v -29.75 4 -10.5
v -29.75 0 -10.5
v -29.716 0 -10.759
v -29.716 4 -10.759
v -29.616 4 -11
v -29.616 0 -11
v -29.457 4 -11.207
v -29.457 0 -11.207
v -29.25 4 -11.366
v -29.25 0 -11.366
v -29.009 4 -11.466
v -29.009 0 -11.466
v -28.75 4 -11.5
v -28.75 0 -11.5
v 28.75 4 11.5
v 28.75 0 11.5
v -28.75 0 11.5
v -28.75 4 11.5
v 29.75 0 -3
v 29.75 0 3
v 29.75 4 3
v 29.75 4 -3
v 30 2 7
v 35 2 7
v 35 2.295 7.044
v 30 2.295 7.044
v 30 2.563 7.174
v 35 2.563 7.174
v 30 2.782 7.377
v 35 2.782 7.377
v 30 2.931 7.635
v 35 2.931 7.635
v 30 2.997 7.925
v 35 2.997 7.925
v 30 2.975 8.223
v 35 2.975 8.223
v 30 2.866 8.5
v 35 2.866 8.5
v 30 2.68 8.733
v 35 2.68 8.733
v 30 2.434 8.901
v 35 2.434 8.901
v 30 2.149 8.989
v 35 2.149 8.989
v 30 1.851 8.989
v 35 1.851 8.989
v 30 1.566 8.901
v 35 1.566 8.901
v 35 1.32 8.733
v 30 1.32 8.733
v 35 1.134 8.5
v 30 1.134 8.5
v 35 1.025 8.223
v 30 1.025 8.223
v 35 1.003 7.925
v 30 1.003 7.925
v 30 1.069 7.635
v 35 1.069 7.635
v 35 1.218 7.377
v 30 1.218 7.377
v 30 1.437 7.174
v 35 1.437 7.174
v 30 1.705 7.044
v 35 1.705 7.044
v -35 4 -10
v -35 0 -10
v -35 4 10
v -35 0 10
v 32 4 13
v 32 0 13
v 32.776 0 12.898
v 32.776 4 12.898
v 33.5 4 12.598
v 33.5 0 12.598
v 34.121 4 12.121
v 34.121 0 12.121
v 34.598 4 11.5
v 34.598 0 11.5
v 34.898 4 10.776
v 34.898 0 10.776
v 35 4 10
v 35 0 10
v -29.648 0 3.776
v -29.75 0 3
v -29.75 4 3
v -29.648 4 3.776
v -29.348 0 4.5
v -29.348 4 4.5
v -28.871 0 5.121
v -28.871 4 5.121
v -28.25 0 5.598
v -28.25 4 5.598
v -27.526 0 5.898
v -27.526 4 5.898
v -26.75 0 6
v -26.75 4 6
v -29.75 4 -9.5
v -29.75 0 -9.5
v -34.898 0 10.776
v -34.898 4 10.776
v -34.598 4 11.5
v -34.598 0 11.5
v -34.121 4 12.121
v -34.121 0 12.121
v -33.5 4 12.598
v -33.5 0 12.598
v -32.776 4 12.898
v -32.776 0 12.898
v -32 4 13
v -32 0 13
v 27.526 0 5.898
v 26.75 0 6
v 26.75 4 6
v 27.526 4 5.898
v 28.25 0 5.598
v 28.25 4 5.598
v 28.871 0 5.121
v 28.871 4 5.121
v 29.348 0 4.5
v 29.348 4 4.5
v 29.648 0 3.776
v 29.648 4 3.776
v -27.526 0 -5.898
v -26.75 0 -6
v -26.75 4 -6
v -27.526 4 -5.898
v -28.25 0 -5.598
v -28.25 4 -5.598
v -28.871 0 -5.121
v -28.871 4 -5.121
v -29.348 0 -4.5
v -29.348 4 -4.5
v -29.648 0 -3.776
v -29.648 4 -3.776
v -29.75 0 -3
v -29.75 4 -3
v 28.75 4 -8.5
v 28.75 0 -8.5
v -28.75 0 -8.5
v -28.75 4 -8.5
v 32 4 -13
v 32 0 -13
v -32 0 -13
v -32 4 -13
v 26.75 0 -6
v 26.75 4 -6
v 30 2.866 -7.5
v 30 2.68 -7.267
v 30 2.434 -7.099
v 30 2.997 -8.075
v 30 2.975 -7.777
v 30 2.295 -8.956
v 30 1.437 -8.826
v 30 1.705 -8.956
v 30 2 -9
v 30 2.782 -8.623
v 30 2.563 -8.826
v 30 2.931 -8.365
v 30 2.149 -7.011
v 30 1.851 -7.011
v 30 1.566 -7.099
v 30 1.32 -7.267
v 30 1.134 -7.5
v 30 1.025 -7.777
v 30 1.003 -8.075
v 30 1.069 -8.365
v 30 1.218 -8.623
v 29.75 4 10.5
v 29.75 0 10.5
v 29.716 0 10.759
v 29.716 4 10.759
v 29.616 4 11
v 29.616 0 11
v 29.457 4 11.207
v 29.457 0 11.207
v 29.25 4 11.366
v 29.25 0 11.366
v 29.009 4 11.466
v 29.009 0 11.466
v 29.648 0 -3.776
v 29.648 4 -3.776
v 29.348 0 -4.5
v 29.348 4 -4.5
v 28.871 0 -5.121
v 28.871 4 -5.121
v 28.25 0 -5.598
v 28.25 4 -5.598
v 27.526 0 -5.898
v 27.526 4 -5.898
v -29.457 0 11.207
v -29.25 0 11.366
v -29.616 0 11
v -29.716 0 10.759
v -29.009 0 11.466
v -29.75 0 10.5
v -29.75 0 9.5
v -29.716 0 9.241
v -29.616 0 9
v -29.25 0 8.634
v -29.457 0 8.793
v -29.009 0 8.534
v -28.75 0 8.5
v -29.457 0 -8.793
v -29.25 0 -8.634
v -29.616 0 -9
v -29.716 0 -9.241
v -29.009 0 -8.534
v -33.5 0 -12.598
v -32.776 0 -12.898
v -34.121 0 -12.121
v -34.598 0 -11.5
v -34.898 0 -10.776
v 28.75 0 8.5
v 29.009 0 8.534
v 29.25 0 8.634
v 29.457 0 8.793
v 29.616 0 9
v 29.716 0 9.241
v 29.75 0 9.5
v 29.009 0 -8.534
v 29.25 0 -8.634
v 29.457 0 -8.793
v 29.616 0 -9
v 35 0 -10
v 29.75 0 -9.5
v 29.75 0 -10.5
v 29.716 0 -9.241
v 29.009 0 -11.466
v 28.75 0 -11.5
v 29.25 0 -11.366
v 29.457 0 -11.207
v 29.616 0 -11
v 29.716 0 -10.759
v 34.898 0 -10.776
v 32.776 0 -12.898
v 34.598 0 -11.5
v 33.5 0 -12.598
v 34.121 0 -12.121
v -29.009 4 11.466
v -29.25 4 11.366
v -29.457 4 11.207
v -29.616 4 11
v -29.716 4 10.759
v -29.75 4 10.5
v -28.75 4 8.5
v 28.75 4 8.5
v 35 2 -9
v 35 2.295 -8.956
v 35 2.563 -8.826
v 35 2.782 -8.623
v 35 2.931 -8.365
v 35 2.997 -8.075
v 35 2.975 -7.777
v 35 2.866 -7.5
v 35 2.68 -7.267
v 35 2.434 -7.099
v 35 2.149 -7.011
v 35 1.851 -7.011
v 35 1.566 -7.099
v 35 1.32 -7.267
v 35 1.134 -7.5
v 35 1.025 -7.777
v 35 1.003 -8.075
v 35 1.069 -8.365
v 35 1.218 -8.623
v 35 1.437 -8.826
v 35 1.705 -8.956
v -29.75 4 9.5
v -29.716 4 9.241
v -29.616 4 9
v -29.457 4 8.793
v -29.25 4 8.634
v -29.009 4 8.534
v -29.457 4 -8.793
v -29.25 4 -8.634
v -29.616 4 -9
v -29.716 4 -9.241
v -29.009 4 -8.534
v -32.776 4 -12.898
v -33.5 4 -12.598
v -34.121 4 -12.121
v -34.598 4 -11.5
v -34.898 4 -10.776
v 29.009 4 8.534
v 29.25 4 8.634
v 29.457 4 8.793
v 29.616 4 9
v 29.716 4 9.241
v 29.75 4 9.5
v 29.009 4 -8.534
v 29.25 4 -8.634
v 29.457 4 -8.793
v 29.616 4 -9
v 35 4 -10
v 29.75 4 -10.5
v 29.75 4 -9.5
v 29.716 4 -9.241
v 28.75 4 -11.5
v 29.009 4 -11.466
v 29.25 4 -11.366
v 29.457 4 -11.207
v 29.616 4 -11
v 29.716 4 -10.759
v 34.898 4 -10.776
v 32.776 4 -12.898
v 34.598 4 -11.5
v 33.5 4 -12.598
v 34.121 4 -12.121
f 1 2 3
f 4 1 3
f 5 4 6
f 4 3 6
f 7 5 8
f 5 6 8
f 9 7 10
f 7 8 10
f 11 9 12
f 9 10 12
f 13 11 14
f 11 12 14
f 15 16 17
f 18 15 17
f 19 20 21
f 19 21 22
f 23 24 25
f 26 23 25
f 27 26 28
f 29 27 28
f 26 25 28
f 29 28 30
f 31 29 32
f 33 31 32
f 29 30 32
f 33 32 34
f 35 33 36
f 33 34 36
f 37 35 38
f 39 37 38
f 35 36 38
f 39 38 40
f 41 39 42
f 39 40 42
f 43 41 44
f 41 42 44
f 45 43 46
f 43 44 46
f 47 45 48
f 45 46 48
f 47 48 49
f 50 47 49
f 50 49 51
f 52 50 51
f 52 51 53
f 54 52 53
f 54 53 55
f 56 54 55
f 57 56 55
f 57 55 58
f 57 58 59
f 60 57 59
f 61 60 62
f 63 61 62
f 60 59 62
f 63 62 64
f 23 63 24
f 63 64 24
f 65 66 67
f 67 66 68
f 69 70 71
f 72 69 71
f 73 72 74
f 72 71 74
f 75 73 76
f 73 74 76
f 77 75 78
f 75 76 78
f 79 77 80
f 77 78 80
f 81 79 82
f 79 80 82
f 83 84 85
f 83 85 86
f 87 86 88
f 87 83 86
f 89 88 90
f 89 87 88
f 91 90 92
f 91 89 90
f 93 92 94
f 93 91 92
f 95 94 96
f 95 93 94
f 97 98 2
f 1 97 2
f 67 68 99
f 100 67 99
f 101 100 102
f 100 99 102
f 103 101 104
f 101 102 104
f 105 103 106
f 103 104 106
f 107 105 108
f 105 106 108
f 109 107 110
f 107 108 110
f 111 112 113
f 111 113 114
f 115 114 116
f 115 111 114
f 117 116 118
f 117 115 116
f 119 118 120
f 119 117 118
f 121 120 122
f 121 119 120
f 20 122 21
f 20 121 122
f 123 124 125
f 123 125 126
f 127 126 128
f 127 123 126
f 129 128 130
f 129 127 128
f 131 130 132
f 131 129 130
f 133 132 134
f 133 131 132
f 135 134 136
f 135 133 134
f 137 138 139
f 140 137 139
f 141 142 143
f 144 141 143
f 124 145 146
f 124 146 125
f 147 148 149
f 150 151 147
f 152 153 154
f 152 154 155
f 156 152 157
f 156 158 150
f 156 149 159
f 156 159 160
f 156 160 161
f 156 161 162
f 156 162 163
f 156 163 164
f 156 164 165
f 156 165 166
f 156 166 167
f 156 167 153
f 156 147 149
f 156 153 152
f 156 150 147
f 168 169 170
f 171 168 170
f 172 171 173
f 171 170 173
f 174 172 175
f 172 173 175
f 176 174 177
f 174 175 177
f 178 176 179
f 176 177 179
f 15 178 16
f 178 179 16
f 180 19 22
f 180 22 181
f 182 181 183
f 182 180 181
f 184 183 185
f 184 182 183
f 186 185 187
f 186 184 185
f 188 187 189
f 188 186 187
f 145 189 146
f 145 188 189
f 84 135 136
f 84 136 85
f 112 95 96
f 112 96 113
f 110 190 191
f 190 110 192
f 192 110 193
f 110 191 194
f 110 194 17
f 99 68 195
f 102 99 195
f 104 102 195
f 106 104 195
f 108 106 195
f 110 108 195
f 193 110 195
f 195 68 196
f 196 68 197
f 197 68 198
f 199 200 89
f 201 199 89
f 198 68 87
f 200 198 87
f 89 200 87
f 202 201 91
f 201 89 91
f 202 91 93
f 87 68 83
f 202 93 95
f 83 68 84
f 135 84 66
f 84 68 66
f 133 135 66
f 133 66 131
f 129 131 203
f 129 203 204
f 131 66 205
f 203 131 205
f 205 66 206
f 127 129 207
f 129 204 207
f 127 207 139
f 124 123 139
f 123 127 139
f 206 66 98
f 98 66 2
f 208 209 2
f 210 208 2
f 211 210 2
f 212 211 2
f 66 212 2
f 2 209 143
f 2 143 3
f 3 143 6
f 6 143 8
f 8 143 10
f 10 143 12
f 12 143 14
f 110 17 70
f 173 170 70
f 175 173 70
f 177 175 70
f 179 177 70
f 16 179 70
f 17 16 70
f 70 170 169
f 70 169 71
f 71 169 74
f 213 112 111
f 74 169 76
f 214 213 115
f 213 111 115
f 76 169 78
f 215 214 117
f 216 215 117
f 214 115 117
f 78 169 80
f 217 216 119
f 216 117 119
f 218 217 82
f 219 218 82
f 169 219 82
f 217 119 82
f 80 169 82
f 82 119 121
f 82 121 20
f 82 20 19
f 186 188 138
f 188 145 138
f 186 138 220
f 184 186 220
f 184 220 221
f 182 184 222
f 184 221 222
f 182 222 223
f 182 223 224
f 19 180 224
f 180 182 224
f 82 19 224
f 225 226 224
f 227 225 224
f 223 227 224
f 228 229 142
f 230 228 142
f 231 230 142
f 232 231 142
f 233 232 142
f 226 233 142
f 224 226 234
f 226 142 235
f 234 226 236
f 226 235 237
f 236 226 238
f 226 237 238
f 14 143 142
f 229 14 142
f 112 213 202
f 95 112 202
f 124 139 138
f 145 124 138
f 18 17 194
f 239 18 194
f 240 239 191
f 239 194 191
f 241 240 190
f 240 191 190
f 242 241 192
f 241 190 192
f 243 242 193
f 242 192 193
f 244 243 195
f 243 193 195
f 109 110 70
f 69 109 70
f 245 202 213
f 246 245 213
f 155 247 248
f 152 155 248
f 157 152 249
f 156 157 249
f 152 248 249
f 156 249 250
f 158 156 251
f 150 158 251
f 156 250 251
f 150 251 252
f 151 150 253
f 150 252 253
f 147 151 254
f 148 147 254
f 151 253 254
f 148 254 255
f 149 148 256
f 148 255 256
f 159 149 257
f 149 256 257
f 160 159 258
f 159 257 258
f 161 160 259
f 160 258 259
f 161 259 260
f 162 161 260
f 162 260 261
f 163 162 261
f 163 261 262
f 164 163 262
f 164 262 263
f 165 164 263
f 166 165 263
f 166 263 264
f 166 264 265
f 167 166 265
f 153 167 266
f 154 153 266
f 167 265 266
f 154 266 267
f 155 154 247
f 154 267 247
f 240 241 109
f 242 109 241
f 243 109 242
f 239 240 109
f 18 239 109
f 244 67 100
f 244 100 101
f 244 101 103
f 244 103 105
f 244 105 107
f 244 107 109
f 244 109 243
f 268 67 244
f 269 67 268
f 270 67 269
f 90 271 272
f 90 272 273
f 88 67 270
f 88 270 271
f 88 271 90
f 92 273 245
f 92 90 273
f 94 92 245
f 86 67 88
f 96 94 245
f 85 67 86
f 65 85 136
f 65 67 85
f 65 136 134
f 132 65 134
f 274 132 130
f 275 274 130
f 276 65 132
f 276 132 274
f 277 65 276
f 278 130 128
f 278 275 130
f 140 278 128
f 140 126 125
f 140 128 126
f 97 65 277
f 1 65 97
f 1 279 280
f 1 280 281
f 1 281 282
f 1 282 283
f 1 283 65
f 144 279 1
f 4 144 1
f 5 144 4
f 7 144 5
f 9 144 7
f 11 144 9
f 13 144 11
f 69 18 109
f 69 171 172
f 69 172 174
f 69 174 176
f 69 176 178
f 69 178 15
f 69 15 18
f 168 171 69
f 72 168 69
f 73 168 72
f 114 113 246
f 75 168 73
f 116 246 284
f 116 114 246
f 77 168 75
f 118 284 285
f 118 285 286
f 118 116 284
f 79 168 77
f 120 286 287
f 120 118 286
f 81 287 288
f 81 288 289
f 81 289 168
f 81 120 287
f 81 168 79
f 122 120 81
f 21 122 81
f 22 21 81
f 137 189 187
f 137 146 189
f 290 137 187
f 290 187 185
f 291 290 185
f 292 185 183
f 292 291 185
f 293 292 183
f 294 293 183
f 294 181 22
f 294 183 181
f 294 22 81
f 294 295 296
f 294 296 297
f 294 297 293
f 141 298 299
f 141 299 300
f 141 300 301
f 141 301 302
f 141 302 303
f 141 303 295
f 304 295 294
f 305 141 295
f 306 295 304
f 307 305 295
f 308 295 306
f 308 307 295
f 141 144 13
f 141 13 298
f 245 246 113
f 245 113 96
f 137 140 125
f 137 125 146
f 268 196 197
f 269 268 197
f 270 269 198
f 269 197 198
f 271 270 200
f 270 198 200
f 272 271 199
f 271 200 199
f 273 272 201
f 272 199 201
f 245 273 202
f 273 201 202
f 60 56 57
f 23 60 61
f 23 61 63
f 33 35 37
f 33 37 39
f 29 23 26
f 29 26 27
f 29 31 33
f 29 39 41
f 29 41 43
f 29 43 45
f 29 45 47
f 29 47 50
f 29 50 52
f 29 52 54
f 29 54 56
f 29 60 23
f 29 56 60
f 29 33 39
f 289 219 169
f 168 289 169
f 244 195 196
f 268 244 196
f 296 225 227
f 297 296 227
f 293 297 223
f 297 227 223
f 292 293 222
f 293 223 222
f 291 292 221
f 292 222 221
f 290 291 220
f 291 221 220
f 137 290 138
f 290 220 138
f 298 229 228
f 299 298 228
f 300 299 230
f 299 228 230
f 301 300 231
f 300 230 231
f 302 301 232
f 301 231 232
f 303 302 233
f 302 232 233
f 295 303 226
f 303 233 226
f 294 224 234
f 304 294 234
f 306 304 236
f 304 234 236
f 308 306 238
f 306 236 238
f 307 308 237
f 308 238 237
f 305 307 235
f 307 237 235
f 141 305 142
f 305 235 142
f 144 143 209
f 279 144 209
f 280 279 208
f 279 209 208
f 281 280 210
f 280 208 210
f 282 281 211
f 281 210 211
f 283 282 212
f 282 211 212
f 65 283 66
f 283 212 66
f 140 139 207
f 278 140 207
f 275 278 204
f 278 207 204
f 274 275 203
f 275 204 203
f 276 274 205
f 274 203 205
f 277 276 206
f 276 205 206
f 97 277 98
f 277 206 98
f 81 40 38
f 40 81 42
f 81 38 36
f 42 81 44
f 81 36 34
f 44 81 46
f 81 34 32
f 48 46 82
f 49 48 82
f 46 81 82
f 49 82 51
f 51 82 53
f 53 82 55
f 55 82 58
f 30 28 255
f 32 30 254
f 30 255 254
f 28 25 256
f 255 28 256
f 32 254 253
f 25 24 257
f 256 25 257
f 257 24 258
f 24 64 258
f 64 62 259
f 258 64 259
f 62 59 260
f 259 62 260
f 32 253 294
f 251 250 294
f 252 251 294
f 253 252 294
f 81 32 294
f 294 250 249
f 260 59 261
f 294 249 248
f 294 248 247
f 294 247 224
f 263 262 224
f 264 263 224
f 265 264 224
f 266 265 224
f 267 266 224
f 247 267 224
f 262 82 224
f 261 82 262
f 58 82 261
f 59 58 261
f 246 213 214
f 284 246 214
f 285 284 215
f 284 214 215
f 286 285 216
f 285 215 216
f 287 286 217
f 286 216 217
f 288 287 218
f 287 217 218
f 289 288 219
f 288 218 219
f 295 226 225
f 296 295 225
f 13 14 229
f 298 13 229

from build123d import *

# Parameters (mm, degrees)
BOSS_EXTRUDE1_DEPTH = 4
SKETCH2_R           = 1
CUT_EXTRUDE1_DEPTH  = 5


with BuildPart() as part:
    # Sketch1 → Boss-Extrude1 (new body)
    with BuildSketch(Plane(origin=(0, 0, 0), x_dir=(1, 0, 0), z_dir=(0, 1, 0))):
        with BuildLine():
            Line((-32, -13), (32, -13))
            ThreePointArc((32, -13), (34.121320344, -12.121320344), (35, -10))
            Line((35, -10), (35, 10))
            ThreePointArc((35, 10), (34.121320344, 12.121320344), (32, 13))
            Line((32, 13), (-32, 13))
            ThreePointArc((-32, 13), (-34.121320344, 12.121320344), (-35, 10))
            Line((-35, 10), (-35, -10))
            ThreePointArc((-35, -10), (-34.121320344, -12.121320344), (-32, -13))
        make_face()
        with BuildLine():
            Line((-26.749817226, -6), (26.749817226, -6))
            ThreePointArc((26.749817226, -6), (28.871137569, -5.121320344), (29.749817226, -3))
            Line((29.749817226, -3), (29.749817226, 3))
            ThreePointArc((29.749817226, 3), (28.871137569, 5.121320344), (26.749817226, 6))
            Line((26.749817226, 6), (-26.749817226, 6))
            ThreePointArc((-26.749817226, 6), (-28.871137569, 5.121320344), (-29.749817226, 3))
            Line((-29.749817226, 3), (-29.749817226, -3))
            ThreePointArc((-29.749817226, -3), (-28.871137569, -5.121320344), (-26.749817226, -6))
        make_face(mode=Mode.SUBTRACT)
        with BuildLine():
            Line((-28.749817226, 11.5), (28.749817226, 11.5))
            ThreePointArc((28.749817226, 11.5), (29.456924007, 11.207106781), (29.749817226, 10.5))
            Line((29.749817226, 10.5), (29.749817226, 9.5))
            ThreePointArc((29.749817226, 9.5), (29.456924007, 8.792893219), (28.749817226, 8.5))
            Line((28.749817226, 8.5), (-28.749817226, 8.5))
            ThreePointArc((-28.749817226, 8.5), (-29.456924007, 8.792893219), (-29.749817226, 9.5))
            Line((-29.749817226, 9.5), (-29.749817226, 10.5))
            ThreePointArc((-29.749817226, 10.5), (-29.456924007, 11.207106781), (-28.749817226, 11.5))
        make_face(mode=Mode.SUBTRACT)
        with BuildLine():
            Line((-29.749817226, -10.5), (-29.749817226, -9.5))
            ThreePointArc((-29.749817226, -9.5), (-29.456924007, -8.792893219), (-28.749817226, -8.5))
            Line((-28.749817226, -8.5), (28.749817226, -8.5))
            ThreePointArc((28.749817226, -8.5), (29.456924007, -8.792893219), (29.749817226, -9.5))
            Line((29.749817226, -9.5), (29.749817226, -10.5))
            ThreePointArc((29.749817226, -10.5), (29.456924007, -11.207106781), (28.749817226, -11.5))
            Line((28.749817226, -11.5), (-28.749817226, -11.5))
            ThreePointArc((-28.749817226, -11.5), (-29.456924007, -11.207106781), (-29.749817226, -10.5))
        make_face(mode=Mode.SUBTRACT)
    extrude(amount=BOSS_EXTRUDE1_DEPTH)

    # Sketch2 → Cut-Extrude1 (cut)
    with BuildSketch(Plane(origin=(35, 0, 0), x_dir=(0, 0, -1), z_dir=(1, 0, 0))):
        with Locations((-8, 2)):
            Circle(SKETCH2_R)
        with Locations((8, 2)):
            Circle(SKETCH2_R)
    extrude(amount=-CUT_EXTRUDE1_DEPTH, mode=Mode.SUBTRACT)


solid = part.part
